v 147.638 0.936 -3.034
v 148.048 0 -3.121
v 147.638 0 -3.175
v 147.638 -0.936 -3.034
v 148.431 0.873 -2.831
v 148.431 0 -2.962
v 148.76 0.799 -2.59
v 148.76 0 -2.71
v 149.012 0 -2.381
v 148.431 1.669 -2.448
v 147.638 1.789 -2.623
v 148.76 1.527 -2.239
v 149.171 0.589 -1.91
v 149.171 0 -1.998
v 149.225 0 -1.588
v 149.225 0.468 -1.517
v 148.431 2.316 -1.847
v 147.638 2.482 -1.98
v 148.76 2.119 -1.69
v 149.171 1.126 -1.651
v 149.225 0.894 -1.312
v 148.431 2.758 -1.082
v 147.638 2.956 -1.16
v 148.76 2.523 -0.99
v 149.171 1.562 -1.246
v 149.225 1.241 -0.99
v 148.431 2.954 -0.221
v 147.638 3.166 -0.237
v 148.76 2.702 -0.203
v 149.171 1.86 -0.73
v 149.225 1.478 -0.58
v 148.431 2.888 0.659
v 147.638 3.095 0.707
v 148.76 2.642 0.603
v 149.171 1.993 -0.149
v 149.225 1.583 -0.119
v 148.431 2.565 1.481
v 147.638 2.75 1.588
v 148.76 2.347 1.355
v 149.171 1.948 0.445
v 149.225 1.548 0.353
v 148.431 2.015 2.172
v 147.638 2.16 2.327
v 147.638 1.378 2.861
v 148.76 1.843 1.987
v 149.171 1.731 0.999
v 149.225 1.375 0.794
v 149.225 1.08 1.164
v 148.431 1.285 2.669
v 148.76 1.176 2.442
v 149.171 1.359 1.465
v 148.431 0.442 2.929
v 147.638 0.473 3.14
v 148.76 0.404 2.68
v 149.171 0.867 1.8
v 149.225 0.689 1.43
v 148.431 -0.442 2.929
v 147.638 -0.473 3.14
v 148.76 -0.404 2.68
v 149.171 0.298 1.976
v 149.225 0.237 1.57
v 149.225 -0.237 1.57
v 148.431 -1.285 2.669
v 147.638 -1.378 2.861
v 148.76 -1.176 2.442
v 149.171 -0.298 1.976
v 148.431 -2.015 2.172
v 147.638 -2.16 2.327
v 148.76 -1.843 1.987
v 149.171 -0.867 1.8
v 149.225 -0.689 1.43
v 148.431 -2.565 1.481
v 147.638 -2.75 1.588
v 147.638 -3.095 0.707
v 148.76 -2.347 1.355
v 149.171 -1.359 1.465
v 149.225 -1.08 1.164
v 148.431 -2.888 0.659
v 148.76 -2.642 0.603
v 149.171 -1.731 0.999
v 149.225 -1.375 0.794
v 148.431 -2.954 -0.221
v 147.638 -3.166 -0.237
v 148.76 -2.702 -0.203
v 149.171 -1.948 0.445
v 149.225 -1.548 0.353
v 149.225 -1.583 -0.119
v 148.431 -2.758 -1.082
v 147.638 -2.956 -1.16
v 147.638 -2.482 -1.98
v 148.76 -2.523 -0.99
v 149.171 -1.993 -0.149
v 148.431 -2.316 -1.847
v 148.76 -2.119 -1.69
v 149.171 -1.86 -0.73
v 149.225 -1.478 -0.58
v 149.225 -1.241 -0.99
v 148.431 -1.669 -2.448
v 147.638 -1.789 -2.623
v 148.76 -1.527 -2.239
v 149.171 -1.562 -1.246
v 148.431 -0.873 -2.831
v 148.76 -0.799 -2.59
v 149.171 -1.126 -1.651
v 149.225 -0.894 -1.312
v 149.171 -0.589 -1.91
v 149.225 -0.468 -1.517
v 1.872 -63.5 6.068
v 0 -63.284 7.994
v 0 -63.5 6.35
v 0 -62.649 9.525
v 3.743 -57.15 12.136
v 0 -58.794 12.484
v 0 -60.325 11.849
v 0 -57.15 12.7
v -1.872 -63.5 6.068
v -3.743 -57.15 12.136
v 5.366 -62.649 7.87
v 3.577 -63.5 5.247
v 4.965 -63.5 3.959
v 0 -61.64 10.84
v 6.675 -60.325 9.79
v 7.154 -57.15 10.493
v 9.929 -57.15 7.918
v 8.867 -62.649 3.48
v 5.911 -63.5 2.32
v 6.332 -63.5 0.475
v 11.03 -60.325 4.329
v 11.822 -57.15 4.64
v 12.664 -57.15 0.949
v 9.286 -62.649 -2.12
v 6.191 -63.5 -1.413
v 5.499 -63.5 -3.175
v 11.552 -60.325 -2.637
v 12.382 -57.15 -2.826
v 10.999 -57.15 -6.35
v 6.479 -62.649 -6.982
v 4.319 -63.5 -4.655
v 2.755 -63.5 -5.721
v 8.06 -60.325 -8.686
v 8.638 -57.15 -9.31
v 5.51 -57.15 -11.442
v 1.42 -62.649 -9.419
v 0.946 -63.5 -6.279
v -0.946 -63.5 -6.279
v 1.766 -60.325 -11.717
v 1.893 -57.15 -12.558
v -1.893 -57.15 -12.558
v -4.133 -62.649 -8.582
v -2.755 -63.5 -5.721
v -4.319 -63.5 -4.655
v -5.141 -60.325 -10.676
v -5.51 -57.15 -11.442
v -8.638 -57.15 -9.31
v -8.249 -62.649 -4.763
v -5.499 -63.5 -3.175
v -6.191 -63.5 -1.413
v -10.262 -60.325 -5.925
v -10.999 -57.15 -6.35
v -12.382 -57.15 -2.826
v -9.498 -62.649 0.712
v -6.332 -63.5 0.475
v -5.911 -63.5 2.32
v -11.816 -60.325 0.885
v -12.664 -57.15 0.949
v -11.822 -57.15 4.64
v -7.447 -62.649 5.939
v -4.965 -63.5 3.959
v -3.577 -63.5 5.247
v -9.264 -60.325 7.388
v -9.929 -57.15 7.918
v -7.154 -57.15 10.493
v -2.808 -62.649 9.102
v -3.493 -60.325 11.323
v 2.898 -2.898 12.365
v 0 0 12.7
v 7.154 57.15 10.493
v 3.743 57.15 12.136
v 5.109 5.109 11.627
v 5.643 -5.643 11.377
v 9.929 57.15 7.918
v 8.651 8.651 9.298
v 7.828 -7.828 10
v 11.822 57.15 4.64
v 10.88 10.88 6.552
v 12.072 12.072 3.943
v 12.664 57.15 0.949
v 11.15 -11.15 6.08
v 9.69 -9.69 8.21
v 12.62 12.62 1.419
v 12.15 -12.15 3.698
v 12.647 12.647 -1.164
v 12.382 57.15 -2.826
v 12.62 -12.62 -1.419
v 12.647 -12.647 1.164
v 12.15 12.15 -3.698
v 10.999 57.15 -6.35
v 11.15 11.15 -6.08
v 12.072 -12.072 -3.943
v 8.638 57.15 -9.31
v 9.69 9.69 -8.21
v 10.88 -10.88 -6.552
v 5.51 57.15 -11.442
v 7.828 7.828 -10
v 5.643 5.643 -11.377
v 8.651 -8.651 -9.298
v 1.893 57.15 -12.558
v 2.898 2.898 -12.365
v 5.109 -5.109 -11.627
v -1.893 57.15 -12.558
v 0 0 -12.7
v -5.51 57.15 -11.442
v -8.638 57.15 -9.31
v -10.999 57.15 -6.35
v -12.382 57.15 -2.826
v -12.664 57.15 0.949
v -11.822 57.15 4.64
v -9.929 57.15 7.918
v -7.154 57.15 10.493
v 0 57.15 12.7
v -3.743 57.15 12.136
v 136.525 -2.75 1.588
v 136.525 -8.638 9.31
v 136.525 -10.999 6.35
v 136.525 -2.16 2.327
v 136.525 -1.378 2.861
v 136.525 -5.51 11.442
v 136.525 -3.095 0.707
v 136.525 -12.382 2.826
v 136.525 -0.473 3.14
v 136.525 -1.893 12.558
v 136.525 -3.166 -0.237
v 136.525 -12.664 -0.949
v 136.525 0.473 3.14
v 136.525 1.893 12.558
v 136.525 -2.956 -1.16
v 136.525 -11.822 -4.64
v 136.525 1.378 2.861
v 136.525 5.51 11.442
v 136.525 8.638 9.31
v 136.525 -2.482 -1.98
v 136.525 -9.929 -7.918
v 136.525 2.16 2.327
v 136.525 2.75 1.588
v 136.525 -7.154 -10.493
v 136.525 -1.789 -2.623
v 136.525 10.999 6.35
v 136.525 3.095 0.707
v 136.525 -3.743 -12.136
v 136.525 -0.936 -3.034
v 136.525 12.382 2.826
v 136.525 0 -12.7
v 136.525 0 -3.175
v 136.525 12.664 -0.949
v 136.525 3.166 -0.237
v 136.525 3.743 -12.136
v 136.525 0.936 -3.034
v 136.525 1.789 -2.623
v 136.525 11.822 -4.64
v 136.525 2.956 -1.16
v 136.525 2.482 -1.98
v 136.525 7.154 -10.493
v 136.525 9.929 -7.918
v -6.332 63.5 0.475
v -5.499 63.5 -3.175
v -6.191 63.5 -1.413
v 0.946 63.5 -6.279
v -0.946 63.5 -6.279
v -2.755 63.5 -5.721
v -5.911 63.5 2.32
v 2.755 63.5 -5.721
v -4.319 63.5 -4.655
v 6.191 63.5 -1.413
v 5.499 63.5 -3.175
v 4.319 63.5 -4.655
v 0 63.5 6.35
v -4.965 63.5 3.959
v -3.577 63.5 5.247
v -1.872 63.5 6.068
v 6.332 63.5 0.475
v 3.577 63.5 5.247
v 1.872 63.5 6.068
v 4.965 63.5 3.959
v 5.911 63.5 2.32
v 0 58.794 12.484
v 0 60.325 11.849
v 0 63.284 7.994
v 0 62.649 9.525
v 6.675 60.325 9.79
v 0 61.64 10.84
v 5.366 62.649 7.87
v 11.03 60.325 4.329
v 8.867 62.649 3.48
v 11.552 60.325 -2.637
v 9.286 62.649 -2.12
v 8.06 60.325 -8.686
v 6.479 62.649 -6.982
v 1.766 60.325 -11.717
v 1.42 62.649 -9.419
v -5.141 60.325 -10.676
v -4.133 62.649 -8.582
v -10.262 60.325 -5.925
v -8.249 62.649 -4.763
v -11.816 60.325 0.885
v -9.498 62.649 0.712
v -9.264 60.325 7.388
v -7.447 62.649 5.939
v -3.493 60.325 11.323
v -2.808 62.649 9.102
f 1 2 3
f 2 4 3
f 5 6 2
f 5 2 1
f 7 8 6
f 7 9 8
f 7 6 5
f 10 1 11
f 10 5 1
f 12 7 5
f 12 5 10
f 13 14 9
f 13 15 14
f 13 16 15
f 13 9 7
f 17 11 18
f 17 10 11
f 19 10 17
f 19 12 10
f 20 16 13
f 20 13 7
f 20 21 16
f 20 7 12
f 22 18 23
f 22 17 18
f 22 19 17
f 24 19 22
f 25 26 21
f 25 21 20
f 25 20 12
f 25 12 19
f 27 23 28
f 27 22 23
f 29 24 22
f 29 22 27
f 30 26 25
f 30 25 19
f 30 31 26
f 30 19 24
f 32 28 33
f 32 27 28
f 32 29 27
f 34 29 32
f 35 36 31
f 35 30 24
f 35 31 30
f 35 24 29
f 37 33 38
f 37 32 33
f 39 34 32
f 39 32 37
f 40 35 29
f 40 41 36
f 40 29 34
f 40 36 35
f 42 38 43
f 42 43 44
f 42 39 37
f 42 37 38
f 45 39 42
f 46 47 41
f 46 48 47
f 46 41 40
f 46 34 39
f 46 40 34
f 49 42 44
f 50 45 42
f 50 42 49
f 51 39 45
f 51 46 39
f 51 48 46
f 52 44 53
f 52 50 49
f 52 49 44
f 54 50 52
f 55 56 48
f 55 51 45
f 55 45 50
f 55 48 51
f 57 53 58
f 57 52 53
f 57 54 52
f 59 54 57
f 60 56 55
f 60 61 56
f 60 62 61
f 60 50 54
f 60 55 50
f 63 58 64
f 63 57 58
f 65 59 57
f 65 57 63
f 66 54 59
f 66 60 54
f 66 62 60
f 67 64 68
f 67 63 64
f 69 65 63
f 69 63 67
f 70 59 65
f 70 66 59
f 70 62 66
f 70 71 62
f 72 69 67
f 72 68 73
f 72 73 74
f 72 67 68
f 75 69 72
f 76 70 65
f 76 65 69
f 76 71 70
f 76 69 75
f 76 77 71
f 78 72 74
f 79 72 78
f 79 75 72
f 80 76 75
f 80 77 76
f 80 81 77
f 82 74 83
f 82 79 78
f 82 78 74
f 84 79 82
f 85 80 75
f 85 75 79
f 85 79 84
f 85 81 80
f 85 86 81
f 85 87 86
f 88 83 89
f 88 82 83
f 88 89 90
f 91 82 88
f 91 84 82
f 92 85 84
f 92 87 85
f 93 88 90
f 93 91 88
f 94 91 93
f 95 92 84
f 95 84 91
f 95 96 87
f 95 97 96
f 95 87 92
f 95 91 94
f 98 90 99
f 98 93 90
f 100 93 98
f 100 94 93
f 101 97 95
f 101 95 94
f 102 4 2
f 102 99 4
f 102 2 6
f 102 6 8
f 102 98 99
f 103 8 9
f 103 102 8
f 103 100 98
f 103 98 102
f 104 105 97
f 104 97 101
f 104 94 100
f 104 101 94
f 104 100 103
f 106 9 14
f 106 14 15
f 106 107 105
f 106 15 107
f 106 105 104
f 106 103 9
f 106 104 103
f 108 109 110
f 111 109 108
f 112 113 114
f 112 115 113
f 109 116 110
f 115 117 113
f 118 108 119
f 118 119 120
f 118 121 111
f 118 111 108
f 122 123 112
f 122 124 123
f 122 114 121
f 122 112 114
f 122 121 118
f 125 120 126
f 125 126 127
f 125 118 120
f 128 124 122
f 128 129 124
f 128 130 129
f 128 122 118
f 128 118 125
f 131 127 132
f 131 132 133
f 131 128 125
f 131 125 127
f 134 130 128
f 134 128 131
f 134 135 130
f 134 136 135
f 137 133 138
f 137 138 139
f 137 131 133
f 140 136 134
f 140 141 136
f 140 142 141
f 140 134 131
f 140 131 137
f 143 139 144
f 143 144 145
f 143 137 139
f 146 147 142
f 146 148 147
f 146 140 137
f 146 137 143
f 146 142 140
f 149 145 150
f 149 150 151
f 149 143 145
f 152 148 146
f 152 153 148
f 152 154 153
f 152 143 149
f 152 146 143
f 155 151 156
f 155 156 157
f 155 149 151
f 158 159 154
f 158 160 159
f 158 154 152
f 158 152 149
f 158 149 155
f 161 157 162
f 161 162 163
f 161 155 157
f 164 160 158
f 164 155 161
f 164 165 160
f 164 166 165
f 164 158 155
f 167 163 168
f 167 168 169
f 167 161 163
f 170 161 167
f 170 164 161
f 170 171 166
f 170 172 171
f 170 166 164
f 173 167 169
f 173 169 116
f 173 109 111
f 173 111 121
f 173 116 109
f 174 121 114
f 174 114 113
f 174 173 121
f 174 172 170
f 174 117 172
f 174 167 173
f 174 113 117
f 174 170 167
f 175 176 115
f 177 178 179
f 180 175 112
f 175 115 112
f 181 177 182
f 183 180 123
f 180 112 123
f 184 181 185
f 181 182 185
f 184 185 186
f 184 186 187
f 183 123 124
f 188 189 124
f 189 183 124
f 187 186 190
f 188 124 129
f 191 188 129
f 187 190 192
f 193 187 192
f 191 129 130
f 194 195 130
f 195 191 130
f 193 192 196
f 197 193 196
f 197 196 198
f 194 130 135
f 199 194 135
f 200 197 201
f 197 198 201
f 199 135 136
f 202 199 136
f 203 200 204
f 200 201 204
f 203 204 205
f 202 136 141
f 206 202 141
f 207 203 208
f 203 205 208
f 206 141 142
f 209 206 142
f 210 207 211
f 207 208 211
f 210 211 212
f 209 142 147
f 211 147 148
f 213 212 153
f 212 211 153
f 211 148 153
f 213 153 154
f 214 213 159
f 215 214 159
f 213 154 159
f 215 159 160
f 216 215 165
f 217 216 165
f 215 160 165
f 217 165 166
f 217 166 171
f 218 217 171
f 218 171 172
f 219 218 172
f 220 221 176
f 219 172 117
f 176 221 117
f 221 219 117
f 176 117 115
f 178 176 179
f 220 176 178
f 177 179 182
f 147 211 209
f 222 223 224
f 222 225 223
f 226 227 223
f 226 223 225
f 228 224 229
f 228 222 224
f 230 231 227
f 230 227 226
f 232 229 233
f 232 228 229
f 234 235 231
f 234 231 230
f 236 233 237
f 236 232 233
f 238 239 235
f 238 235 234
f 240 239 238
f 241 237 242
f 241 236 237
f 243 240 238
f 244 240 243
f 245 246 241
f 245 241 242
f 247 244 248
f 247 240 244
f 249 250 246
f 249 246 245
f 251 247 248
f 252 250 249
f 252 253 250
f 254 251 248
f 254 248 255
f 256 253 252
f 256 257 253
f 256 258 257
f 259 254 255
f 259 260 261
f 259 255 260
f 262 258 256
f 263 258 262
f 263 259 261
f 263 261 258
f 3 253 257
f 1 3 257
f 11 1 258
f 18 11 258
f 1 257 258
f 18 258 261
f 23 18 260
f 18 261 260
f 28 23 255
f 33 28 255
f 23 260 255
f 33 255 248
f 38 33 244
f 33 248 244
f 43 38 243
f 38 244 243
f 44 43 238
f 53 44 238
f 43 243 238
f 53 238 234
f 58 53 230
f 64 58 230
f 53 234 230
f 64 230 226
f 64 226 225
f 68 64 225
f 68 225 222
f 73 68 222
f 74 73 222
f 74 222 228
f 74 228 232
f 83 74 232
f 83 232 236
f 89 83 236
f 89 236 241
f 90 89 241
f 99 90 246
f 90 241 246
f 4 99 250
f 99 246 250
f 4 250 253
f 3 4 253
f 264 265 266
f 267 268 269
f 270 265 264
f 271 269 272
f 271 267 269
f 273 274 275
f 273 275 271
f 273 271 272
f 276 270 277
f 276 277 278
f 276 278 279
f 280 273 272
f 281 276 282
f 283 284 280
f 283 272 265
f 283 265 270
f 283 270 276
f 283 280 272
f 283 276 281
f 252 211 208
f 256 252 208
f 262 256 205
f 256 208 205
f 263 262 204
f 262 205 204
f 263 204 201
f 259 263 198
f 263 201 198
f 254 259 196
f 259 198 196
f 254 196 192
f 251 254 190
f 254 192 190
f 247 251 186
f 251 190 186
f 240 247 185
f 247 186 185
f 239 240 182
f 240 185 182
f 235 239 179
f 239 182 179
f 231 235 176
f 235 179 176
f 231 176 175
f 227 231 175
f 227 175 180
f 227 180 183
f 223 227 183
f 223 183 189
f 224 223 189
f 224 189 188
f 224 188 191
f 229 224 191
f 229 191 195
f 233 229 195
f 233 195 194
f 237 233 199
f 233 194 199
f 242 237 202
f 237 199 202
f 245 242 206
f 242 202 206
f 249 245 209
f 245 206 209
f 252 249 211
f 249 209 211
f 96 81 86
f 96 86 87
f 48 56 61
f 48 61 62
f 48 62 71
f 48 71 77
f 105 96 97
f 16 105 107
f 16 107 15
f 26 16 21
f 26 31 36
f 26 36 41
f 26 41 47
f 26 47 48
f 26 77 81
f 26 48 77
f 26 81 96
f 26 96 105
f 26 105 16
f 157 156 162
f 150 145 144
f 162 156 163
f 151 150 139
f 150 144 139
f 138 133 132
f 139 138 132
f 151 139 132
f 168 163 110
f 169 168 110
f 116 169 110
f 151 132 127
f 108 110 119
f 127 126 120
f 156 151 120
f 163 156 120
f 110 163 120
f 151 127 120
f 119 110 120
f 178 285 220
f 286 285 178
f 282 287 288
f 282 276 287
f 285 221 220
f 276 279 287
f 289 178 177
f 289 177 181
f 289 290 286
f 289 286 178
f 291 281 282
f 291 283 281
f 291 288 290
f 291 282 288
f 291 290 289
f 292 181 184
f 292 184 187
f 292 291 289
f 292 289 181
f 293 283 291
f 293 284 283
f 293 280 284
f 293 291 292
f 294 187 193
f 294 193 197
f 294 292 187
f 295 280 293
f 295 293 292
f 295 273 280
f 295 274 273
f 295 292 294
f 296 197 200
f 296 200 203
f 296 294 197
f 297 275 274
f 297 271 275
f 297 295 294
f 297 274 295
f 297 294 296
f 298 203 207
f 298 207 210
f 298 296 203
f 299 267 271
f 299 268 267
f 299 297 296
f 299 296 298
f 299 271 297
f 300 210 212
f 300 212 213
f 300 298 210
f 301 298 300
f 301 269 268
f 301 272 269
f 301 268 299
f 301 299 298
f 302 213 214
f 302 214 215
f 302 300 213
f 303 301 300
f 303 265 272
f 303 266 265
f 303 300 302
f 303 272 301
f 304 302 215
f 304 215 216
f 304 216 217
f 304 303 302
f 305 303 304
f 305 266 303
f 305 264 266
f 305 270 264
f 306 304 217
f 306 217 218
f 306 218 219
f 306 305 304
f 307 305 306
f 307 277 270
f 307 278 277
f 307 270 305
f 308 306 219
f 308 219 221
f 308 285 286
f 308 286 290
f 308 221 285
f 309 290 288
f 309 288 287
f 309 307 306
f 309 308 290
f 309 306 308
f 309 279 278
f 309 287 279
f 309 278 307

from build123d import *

# Parameters (mm, degrees)
SKETCH1_R                = 12.7
BOSS_EXTRUDE1_DEPTH      = 136.525
SKETCH2_R                = 3.175
BOSS_EXTRUDE2_DEPTH      = 12.7
FILLET2_R                = 1.5875
BOSS_EXTRUDE3_DEPTH      = 63.5
BOSS_EXTRUDE3_DEPTH_BACK = 63.5
SKETCH3_R                = 12.7
FILLET3_R                = 6.35


with BuildPart() as part:
    # Sketch1 → Boss-Extrude1 (new body)
    with BuildSketch(Plane(origin=(0, 0, 0), x_dir=(0, 0, -1), z_dir=(1, 0, 0))):
        Circle(SKETCH1_R)
    extrude(amount=BOSS_EXTRUDE1_DEPTH)

    # Sketch2 → Boss-Extrude2 (add)
    with BuildSketch(Plane(origin=(136.525, 0, 0), x_dir=(0, 0, -1), z_dir=(1, 0, 0))):
        Circle(SKETCH2_R)
    extrude(amount=BOSS_EXTRUDE2_DEPTH)

    # Fillet2
    fillet2_edges = [part.edges().sort_by_distance(p)[0] for p in [
        (149.225, 0, 3.175),
    ]]
    fillet(fillet2_edges, radius=FILLET2_R)

    # Sketch3 → Boss-Extrude3 (add, two sides: drawn at the far end of the back side and taken through both)
    with BuildSketch(Plane(origin=(0, 0, 0), x_dir=(1, 0, 0), z_dir=(0, 1, 0)).offset(-BOSS_EXTRUDE3_DEPTH_BACK)):
        Circle(SKETCH3_R)
    extrude(amount=BOSS_EXTRUDE3_DEPTH + BOSS_EXTRUDE3_DEPTH_BACK)

    # Fillet3
    fillet3_edges = [part.edges().sort_by_distance(p)[0] for p in [
        (-12.7, 63.5, 0),
        (-12.7, -63.5, 0),
    ]]
    fillet(fillet3_edges, radius=FILLET3_R)


solid = part.part
